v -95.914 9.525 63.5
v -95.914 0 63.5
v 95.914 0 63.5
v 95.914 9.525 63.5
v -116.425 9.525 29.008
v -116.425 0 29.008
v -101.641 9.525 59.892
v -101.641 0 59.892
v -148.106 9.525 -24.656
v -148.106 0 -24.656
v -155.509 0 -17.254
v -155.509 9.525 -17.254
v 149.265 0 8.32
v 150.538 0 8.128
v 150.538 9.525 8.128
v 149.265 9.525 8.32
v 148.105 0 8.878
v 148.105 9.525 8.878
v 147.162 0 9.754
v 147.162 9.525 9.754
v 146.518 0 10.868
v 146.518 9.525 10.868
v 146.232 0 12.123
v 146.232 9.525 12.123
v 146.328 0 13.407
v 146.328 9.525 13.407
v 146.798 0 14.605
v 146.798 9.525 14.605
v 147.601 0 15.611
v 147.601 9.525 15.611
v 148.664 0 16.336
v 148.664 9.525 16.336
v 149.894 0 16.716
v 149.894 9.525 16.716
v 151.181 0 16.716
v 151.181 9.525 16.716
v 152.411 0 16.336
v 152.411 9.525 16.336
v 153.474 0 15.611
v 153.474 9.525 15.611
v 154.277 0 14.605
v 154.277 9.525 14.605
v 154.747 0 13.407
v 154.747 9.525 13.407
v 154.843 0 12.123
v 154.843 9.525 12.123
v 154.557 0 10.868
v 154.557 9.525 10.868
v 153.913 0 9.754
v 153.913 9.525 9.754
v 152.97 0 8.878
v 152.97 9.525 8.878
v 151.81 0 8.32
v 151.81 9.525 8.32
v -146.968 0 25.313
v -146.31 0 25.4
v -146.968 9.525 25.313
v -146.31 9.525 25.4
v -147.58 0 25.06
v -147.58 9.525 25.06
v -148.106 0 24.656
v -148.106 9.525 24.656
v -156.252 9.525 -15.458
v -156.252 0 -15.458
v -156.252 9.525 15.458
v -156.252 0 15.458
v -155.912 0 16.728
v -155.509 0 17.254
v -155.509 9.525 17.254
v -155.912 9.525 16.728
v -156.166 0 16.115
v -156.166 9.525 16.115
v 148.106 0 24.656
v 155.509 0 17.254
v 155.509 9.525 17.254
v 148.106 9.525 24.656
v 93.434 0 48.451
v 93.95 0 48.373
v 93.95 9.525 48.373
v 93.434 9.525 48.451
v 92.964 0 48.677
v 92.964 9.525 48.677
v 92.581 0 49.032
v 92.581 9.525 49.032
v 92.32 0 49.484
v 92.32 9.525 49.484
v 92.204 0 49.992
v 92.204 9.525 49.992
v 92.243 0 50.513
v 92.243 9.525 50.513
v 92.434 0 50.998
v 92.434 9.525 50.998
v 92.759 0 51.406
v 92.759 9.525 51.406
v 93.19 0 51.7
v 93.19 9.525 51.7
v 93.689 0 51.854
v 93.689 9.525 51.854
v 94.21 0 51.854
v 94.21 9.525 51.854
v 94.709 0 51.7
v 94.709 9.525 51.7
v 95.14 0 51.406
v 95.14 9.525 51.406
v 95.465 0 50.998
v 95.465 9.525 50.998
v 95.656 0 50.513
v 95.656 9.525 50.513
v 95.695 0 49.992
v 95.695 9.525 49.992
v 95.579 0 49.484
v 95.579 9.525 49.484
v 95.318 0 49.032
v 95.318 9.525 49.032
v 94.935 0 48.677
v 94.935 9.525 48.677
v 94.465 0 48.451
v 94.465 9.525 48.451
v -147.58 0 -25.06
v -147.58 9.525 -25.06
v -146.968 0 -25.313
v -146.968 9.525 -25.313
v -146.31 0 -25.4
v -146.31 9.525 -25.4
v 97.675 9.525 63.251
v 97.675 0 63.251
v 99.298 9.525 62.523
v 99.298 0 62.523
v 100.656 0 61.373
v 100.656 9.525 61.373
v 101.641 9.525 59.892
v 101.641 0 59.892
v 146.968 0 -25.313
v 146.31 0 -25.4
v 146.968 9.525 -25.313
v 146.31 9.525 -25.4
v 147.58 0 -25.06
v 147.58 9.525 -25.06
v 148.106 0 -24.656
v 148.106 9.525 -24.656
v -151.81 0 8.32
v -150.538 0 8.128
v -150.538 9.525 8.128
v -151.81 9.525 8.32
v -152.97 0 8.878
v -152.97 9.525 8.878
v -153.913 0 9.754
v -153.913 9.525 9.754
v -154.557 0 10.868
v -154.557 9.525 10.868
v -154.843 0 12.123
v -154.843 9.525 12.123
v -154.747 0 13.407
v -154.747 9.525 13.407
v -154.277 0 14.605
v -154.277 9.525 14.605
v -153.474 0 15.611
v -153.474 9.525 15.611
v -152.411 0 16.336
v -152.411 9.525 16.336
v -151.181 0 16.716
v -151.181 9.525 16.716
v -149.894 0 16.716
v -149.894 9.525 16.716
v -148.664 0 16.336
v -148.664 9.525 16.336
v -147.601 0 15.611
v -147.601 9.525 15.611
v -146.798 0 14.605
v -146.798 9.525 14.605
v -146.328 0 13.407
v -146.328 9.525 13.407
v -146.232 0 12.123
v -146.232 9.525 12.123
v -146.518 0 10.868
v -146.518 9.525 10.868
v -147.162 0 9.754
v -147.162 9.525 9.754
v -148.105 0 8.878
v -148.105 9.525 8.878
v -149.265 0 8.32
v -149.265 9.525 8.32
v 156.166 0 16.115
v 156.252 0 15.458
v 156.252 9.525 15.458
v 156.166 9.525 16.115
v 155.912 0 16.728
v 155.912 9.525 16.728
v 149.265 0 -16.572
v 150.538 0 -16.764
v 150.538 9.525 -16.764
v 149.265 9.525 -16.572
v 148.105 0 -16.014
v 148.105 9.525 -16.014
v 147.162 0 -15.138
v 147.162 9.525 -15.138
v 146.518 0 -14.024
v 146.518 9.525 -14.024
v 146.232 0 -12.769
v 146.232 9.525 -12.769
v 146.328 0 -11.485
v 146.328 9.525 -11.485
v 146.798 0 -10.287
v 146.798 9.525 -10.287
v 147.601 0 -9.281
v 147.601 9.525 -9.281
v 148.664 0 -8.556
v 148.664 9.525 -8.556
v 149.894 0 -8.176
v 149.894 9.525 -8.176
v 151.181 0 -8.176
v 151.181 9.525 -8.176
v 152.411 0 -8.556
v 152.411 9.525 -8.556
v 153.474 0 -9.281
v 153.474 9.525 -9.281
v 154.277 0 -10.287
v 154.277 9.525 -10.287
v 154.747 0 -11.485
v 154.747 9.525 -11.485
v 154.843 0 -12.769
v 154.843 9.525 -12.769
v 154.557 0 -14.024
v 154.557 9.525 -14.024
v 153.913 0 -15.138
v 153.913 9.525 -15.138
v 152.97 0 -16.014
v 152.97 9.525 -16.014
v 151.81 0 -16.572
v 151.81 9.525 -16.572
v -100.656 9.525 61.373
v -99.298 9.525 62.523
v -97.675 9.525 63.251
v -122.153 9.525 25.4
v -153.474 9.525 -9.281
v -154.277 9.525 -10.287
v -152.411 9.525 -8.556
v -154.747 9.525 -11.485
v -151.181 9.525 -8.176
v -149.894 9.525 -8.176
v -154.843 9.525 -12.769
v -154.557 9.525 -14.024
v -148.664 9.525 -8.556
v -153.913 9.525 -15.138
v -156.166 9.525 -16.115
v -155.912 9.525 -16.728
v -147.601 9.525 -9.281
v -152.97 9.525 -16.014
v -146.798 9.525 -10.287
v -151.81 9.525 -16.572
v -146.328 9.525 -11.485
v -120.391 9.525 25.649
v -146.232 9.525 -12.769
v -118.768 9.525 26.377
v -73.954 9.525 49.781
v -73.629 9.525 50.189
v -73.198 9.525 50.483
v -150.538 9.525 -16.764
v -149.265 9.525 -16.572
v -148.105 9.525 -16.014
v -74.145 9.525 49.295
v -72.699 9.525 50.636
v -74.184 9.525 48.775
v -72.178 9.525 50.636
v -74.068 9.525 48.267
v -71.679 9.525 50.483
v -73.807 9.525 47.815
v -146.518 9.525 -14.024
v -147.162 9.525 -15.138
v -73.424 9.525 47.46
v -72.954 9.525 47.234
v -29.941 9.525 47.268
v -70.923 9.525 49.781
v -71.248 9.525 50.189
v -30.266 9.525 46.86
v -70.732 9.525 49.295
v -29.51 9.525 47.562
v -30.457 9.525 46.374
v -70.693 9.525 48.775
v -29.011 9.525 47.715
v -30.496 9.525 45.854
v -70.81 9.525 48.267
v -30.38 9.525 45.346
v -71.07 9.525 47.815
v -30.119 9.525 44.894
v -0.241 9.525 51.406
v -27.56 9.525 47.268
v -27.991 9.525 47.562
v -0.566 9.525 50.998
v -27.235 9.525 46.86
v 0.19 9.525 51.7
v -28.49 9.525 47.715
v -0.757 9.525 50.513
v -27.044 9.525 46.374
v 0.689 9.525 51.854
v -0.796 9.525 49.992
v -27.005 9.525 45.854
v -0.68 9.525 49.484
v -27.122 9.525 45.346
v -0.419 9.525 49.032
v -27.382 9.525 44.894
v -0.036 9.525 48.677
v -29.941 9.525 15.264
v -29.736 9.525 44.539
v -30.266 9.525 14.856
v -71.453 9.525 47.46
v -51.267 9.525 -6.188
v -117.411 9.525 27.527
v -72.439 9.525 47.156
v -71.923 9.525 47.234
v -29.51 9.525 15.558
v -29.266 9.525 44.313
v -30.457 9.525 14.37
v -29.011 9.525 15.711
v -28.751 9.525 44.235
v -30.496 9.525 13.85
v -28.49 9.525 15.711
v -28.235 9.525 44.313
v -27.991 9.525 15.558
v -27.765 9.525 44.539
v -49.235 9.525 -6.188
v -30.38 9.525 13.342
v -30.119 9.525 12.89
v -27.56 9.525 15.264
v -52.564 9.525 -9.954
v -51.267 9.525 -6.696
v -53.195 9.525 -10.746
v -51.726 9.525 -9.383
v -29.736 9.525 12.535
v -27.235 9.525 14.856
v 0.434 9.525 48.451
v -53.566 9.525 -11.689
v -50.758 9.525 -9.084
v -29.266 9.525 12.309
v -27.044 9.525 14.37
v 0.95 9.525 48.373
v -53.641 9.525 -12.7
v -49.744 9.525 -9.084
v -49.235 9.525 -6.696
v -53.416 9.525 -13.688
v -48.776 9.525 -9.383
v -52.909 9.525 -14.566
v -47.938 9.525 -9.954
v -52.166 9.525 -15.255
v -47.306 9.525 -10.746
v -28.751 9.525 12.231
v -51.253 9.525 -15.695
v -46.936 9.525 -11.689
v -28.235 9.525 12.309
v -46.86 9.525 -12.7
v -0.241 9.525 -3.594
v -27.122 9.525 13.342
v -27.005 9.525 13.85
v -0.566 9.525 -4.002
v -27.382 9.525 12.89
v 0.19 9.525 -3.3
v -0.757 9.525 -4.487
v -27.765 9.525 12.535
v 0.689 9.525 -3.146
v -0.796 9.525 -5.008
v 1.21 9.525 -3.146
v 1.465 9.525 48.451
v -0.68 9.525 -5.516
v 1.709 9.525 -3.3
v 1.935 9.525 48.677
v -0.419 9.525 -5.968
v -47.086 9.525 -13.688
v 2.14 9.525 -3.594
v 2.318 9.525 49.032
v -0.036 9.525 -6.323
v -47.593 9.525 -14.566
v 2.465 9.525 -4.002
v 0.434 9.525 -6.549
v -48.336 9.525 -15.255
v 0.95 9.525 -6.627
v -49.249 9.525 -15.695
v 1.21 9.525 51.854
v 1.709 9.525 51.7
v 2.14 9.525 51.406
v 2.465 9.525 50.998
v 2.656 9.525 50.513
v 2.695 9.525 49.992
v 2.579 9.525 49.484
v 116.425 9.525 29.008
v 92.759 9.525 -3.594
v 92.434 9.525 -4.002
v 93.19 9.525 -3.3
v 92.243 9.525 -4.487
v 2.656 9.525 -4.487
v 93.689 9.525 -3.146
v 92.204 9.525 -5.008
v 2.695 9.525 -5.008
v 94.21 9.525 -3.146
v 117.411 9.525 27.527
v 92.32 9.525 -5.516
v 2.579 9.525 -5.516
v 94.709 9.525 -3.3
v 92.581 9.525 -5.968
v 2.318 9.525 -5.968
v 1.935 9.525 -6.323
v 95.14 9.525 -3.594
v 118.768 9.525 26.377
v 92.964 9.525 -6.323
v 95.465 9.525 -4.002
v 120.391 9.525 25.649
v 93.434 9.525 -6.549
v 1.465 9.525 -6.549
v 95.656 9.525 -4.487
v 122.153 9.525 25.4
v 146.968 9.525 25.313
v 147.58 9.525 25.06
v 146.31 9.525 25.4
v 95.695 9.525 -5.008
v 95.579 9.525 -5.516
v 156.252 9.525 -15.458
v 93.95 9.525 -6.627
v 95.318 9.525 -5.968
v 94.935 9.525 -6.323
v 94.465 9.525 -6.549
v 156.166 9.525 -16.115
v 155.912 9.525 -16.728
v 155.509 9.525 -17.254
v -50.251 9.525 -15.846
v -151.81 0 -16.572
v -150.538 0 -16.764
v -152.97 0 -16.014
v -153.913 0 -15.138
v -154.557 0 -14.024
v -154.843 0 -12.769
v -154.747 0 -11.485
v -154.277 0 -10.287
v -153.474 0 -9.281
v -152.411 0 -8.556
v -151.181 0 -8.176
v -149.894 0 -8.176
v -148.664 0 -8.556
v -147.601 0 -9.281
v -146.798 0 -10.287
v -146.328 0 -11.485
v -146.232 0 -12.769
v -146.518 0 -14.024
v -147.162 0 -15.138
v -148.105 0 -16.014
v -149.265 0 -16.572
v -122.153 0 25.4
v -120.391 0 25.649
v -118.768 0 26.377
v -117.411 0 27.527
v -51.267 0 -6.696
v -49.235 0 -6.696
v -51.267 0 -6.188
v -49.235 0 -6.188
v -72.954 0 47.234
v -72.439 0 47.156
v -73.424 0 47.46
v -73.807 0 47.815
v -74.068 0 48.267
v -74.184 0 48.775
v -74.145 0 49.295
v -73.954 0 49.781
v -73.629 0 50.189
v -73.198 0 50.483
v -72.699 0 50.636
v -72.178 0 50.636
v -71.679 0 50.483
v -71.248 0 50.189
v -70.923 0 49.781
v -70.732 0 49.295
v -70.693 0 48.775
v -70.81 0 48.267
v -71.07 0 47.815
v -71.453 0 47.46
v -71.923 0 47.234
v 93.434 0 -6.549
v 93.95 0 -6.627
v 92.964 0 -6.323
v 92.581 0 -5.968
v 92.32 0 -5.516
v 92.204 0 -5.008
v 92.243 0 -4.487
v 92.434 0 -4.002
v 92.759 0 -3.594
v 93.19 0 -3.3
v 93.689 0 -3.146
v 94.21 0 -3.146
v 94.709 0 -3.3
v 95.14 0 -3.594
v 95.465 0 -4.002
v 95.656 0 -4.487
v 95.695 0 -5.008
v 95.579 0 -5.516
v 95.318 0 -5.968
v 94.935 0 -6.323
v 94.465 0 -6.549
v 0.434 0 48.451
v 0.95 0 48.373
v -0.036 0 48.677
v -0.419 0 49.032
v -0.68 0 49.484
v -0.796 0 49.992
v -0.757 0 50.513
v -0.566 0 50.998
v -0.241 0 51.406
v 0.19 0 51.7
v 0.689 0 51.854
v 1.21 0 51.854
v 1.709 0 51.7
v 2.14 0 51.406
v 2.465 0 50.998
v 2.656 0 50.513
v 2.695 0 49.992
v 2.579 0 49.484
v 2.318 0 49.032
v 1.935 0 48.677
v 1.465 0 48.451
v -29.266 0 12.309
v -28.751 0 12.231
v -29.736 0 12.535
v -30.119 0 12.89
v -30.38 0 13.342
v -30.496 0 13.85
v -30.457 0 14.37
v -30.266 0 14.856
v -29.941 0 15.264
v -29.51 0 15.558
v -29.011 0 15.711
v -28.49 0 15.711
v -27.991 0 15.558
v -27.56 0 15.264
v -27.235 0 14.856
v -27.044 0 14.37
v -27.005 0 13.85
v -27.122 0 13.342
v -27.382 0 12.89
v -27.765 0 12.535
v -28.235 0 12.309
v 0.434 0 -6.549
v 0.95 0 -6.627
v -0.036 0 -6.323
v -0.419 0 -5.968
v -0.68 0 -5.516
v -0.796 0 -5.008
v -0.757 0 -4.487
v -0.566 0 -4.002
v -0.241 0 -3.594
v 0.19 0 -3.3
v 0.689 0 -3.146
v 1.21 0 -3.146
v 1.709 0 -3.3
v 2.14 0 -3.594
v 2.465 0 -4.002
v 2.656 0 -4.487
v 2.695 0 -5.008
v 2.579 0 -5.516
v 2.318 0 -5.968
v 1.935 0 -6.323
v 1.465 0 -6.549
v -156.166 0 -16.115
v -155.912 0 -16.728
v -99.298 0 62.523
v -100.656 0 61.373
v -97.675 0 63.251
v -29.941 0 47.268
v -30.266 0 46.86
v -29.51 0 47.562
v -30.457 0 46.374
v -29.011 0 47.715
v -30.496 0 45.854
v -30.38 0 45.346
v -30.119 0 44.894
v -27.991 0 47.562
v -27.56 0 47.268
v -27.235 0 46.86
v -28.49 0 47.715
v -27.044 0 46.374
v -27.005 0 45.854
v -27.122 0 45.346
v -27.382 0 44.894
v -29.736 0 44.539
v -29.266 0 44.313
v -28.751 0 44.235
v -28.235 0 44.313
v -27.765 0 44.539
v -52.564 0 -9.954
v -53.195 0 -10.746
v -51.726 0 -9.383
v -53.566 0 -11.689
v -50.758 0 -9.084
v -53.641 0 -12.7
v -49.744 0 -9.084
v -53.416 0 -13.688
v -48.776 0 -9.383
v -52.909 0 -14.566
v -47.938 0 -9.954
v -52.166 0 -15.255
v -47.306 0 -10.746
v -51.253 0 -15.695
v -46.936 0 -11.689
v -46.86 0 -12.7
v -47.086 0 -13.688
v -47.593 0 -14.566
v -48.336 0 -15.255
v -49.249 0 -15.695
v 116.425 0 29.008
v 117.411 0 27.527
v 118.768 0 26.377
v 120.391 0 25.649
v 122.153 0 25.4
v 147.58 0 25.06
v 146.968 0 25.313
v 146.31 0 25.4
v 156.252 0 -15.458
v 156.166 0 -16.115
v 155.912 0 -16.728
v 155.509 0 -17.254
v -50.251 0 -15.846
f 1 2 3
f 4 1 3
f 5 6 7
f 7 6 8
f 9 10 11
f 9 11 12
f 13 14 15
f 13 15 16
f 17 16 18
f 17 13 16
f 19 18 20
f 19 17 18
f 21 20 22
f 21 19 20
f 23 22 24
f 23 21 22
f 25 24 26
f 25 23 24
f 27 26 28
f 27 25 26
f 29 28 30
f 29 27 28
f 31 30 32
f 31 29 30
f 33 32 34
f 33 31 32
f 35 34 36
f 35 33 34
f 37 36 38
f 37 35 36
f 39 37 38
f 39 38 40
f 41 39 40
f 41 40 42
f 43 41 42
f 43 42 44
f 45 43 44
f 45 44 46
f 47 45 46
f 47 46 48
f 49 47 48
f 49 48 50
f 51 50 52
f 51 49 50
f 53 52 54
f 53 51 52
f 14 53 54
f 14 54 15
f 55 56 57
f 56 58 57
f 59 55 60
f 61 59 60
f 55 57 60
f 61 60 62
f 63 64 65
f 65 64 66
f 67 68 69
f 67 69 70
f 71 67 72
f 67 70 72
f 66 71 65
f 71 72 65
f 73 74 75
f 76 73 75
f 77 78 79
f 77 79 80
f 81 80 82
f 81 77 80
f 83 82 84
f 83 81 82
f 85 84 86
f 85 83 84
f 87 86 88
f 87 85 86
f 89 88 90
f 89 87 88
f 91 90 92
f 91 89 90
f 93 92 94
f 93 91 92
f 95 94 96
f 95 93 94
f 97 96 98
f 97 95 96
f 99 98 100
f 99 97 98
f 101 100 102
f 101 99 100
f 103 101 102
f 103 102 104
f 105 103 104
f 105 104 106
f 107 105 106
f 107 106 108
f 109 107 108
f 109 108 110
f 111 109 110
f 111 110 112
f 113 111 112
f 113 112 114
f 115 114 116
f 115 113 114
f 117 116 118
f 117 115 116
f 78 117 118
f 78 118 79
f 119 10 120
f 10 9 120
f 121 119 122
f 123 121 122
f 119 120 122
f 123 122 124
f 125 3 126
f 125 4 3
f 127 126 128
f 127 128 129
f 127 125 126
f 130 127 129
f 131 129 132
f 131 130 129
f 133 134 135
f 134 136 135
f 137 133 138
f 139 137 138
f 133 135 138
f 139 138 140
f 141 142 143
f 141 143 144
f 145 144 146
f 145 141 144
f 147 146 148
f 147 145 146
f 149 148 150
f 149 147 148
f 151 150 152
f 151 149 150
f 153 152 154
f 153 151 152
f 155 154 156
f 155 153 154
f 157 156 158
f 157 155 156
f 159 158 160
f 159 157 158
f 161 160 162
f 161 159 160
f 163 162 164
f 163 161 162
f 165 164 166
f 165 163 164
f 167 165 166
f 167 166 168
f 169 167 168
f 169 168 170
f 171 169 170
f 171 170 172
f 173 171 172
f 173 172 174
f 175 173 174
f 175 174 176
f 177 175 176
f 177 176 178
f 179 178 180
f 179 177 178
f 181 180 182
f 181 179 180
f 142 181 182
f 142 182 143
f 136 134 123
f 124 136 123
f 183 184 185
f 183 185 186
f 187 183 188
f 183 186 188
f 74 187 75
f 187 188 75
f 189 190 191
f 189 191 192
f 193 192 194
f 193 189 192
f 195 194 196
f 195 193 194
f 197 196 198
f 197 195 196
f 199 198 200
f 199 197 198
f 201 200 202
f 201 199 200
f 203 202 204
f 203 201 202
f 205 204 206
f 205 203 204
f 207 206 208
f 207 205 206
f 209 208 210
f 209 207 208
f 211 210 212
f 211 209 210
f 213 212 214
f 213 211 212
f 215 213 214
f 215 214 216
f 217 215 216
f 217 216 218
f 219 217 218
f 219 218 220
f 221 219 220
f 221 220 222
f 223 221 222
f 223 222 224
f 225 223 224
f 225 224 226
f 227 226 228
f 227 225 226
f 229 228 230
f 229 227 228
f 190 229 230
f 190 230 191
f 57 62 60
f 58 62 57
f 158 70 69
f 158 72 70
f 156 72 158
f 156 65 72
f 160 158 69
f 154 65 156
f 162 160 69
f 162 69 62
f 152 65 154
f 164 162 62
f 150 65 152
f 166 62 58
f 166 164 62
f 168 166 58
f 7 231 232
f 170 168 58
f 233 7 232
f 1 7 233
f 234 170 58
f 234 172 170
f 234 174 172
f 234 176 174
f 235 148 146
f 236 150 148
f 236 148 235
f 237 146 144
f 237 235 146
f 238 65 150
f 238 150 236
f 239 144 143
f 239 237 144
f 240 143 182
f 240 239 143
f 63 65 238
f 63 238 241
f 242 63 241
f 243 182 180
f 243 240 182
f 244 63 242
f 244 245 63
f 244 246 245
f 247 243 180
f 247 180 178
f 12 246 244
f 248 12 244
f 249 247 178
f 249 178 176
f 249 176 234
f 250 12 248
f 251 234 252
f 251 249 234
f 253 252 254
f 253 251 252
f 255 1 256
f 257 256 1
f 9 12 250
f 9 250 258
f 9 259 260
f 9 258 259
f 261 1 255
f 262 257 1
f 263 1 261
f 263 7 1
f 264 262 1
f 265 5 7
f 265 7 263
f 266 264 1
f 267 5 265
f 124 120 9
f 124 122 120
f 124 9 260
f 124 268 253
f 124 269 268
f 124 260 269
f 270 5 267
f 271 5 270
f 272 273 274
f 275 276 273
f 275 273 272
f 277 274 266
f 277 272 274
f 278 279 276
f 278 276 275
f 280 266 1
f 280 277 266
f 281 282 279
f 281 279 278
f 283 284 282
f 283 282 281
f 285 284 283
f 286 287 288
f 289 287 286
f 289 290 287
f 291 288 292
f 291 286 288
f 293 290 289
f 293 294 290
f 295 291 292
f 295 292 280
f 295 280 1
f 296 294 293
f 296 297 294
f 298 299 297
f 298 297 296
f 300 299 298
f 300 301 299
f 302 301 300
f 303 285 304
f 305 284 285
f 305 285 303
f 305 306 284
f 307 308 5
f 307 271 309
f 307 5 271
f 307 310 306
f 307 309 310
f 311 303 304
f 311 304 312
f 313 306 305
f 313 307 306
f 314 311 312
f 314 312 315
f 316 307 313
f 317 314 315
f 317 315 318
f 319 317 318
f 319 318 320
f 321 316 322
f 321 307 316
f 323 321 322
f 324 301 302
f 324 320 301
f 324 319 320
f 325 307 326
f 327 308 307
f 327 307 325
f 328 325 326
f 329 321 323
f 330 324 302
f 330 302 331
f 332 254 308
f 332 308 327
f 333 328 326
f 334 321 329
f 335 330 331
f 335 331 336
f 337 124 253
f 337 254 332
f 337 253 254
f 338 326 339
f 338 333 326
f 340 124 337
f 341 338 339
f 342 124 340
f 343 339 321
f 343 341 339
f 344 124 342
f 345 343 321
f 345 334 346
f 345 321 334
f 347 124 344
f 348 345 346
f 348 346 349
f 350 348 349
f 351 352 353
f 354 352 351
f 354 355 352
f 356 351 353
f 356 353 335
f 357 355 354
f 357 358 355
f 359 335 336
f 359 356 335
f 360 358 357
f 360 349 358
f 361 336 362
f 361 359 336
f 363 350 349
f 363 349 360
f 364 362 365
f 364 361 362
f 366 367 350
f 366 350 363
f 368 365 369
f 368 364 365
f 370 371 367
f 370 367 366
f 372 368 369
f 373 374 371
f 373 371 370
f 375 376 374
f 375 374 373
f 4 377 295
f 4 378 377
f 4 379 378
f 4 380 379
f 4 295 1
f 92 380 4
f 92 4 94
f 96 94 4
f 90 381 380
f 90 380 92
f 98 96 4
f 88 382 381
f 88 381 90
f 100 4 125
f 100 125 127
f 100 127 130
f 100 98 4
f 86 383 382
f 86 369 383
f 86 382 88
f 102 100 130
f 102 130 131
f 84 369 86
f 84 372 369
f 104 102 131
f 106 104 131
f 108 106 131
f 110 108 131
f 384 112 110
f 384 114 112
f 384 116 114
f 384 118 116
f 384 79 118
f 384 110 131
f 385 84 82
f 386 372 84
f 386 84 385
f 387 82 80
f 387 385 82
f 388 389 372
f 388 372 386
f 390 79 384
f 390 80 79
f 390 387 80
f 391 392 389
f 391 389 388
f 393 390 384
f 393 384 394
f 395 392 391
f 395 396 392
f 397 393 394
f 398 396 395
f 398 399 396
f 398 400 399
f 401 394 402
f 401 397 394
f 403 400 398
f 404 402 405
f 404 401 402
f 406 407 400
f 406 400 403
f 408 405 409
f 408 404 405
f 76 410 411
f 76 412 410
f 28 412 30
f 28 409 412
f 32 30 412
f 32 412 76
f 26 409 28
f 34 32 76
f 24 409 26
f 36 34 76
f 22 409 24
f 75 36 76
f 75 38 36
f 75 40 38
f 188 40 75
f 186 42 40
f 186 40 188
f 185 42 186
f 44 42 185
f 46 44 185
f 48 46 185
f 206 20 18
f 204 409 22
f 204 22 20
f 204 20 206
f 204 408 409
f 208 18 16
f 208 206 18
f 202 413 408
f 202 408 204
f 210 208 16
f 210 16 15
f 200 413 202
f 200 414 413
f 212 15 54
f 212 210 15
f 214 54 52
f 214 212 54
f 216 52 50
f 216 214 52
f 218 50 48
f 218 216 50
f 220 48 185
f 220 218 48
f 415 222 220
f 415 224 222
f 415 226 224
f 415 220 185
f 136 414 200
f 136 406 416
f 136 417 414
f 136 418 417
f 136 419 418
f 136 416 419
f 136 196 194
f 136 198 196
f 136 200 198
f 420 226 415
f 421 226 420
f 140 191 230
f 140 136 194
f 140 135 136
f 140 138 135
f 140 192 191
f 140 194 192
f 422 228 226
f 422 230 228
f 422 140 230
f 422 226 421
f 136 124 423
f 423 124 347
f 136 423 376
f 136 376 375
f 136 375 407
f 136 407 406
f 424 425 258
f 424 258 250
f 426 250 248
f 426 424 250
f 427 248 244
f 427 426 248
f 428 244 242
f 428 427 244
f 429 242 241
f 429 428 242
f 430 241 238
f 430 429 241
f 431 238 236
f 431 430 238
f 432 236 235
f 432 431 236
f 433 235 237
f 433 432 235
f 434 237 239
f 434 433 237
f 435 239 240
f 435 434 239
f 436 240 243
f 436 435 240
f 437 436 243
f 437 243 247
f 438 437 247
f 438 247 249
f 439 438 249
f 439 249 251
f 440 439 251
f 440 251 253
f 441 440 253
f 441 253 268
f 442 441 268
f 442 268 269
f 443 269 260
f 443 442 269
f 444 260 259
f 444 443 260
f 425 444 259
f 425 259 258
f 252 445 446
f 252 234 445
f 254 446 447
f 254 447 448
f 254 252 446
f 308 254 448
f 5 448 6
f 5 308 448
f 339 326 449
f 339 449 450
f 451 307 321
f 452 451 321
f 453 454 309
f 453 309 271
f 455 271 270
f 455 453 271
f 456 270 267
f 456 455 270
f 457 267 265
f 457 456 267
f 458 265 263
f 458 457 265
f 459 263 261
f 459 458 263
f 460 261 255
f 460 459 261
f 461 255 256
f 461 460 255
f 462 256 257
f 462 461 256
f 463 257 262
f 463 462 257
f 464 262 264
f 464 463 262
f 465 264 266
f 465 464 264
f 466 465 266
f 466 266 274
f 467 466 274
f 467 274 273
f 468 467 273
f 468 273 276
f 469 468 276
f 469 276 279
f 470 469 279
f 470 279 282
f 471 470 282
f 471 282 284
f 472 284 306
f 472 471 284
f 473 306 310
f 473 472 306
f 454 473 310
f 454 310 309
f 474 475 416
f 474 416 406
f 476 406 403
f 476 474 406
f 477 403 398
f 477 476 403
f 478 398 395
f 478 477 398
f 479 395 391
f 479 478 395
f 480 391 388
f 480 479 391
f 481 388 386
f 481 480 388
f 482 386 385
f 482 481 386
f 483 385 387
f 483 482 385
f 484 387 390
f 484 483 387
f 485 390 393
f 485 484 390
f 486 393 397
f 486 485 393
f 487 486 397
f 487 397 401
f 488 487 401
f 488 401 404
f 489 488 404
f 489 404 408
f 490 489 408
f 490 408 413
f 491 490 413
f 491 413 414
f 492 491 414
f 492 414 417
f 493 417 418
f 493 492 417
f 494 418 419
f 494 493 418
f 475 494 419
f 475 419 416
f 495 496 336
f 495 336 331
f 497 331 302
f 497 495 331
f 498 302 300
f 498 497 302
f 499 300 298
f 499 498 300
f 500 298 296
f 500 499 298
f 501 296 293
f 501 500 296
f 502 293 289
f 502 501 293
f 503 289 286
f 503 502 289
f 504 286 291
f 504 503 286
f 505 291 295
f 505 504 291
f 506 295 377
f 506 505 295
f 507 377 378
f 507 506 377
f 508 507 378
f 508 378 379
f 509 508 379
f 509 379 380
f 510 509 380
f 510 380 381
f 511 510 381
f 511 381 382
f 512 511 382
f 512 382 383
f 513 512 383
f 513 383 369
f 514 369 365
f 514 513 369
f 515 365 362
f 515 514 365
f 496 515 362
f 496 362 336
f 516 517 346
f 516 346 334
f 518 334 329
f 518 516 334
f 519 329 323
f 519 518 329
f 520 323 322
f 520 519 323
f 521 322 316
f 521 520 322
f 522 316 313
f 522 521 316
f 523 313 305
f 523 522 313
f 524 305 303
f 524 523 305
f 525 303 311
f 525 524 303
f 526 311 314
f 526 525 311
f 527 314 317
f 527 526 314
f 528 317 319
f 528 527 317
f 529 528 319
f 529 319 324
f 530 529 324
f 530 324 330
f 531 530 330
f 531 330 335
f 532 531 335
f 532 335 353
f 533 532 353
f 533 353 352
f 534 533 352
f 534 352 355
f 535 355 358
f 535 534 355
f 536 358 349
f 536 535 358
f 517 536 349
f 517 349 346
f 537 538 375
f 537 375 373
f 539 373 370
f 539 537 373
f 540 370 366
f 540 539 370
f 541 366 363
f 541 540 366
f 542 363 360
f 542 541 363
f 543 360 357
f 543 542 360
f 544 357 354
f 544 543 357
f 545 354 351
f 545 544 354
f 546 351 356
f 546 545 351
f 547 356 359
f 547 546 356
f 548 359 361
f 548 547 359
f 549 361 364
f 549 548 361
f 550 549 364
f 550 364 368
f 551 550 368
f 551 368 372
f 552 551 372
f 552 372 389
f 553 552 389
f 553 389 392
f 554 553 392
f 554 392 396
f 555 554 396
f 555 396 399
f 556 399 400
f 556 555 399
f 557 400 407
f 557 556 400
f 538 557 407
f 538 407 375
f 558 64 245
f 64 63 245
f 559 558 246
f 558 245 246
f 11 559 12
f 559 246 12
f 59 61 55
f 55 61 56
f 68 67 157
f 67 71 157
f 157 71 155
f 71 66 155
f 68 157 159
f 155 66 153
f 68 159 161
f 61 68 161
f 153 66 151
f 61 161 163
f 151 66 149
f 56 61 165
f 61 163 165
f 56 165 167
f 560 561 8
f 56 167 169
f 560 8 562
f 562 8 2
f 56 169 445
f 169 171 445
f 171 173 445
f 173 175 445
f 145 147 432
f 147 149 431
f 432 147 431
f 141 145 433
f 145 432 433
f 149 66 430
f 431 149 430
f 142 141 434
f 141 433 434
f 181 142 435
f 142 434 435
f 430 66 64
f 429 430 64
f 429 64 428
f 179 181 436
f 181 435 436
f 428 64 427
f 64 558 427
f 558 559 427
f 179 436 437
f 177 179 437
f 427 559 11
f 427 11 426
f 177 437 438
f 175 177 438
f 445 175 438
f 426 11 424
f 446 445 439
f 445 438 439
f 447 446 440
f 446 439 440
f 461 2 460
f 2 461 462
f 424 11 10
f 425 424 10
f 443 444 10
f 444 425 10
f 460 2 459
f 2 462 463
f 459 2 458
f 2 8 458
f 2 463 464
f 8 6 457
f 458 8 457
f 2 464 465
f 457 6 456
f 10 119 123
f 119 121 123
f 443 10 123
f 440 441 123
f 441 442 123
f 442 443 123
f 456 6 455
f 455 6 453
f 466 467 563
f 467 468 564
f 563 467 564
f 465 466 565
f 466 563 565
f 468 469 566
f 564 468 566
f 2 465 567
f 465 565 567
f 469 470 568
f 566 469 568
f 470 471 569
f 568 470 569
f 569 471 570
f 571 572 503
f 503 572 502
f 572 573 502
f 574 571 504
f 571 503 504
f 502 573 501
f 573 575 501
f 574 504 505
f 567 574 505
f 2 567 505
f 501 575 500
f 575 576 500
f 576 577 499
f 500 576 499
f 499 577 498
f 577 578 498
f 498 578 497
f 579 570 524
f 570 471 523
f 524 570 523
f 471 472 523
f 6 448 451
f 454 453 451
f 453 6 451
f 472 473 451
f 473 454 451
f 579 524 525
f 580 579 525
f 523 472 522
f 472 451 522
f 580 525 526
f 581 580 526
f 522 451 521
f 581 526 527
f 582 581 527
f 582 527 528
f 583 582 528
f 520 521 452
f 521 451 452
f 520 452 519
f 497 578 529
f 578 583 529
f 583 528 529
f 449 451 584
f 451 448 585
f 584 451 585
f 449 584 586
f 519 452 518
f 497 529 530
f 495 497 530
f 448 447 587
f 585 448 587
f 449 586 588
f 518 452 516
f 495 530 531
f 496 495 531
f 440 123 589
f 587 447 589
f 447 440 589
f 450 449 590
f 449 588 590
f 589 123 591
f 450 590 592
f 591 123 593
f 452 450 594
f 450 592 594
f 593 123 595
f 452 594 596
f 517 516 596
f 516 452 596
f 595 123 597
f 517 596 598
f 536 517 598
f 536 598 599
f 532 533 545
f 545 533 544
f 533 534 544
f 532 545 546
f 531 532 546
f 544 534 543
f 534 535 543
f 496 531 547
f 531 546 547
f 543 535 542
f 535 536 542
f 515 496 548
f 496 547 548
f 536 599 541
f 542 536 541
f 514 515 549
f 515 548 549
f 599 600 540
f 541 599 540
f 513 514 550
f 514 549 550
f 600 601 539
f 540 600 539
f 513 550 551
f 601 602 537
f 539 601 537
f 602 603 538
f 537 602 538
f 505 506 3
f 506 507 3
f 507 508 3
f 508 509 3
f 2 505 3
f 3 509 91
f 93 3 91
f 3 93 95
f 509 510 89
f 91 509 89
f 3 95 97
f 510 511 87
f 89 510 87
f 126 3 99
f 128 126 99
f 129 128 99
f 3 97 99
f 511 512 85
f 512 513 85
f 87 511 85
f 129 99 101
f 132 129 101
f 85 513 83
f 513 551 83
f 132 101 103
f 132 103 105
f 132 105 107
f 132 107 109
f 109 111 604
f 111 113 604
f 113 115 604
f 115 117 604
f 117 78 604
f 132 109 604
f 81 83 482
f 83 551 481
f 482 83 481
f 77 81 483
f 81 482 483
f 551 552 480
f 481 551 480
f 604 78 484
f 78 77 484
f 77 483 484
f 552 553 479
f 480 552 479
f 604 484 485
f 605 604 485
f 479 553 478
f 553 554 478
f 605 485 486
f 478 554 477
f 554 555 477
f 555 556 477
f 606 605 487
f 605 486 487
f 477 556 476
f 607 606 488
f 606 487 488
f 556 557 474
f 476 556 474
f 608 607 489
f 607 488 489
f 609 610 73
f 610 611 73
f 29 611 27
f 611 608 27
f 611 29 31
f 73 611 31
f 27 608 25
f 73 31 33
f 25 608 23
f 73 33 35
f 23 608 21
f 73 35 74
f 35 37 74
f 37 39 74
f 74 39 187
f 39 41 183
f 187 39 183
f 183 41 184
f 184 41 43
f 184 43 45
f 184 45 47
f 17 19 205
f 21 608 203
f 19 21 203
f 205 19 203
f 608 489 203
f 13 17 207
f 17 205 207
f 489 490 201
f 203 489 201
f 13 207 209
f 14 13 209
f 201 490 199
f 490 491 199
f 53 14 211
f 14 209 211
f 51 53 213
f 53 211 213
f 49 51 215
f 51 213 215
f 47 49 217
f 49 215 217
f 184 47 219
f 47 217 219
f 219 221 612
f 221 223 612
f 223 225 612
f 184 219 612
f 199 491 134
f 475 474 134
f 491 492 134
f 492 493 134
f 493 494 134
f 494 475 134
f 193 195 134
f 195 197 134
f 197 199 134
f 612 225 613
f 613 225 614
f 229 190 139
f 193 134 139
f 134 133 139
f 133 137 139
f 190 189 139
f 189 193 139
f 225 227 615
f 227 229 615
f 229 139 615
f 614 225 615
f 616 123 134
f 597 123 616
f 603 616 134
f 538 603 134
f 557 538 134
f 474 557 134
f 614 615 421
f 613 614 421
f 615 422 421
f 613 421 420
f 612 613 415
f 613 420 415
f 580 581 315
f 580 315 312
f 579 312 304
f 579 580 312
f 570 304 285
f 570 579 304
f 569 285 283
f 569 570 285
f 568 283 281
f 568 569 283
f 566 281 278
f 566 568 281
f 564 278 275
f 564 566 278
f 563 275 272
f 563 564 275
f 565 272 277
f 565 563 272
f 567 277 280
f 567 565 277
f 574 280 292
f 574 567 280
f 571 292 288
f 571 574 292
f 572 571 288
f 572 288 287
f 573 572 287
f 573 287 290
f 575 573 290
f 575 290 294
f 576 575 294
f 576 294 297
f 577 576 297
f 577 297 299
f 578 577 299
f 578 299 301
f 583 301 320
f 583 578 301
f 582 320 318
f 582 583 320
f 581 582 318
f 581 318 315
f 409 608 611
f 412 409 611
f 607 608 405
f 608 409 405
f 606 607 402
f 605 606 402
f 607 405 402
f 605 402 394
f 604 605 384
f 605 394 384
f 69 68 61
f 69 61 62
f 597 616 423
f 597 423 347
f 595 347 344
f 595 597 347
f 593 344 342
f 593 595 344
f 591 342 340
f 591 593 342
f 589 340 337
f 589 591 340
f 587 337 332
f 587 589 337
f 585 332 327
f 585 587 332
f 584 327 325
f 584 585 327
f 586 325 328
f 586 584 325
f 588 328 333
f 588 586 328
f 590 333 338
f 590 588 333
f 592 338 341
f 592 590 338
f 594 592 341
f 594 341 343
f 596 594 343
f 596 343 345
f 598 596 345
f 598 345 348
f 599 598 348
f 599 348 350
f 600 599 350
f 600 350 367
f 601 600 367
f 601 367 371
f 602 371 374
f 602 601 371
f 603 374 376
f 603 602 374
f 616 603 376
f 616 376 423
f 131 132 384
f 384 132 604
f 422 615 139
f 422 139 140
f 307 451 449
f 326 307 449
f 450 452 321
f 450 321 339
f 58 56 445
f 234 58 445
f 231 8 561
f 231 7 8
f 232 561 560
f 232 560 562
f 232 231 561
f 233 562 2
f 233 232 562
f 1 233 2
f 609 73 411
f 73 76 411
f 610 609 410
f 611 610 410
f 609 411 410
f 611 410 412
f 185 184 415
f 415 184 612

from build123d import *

# Parameters (mm, degrees)
SKETCH1_R           = 1.75
SKETCH1_R_2         = 4.318
SKETCH1_W           = 2.032
SKETCH1_H           = 0.508
SKETCH1_R_3         = 3.4
BOSS_EXTRUDE1_DEPTH = 9.525
FILLET1_R           = 6.35
CHAMFER1_SIZE       = 8.89
FILLET2_R           = 2.54


with BuildPart() as part:
    # Sketch1 → Boss-Extrude1 (new body)
    with BuildSketch(Plane(origin=(0, 0, 0), x_dir=(1, 0, 0), z_dir=(0, 1, 0))):
        Polygon((-156.2525, 25.4), (-156.2525, -25.4), (-118.1525, -25.4), (-99.913840717, -63.5), (99.913840717, -63.5), (118.1525, -25.4), (156.2525, -25.4), (156.2525, 25.4), align=None)
        with Locations(Location((-72.438538283, -48.905859703, 0), (0, 0, 90))):
            Circle(SKETCH1_R, mode=Mode.SUBTRACT)
        with Locations(Location((-28.750538283, -45.984859703, 0), (0, 0, 90))):
            Circle(SKETCH1_R, mode=Mode.SUBTRACT)
        with Locations(Location((-150.5375, -12.446, 0), (0, 0, 90))):
            Circle(SKETCH1_R_2, mode=Mode.SUBTRACT)
        with Locations(Location((-28.750538283, -13.980859703, 0), (0, 0, 90))):
            Circle(SKETCH1_R, mode=Mode.SUBTRACT)
        with Locations(Location((93.949510286, 4.876851367, 0), (0, 0, 90))):
            Circle(SKETCH1_R, mode=Mode.SUBTRACT)
        with Locations(Location((0.949510286, 4.876851367, 0), (0, 0, 90))):
            Circle(SKETCH1_R, mode=Mode.SUBTRACT)
        with Locations(Location((0.949510286, -50.123148633, 0), (0, 0, 90))):
            Circle(SKETCH1_R, mode=Mode.SUBTRACT)
        with Locations(Location((93.949510286, -50.123148633, 0), (0, 0, 90))):
            Circle(SKETCH1_R, mode=Mode.SUBTRACT)
        with Locations(Location((150.5375, -12.446, 0), (0, 0, 90))):
            Circle(SKETCH1_R_2, mode=Mode.SUBTRACT)
        with Locations(Location((-150.5375, 12.446, 0), (0, 0, 90))):
            Circle(SKETCH1_R_2, mode=Mode.SUBTRACT)
        with Locations((-50.250952403, 6.442)):
            Rectangle(SKETCH1_W, SKETCH1_H, mode=Mode.SUBTRACT)
        with Locations(Location((-50.250952403, 12.446, 0), (0, 0, 90))):
            Circle(SKETCH1_R_3, mode=Mode.SUBTRACT)
        with Locations(Location((150.5375, 12.446, 0), (0, 0, 90))):
            Circle(SKETCH1_R_2, mode=Mode.SUBTRACT)
    extrude(amount=BOSS_EXTRUDE1_DEPTH)

    # Fillet1
    fillet1_edges = [part.edges().sort_by_distance(p)[0] for p in [
        (118.1525, 4.7625, 25.4),
        (99.913840717, 4.7625, 63.5),
        (-99.913840717, 4.7625, 63.5),
        (-118.1525, 4.7625, 25.4),
    ]]
    fillet(fillet1_edges, radius=FILLET1_R)

    # Chamfer1
    chamfer1_edges = [part.edges().sort_by_distance(p)[0] for p in [
        (156.2525, 4.7625, -25.4),
        (156.2525, 4.7625, 25.4),
        (-156.2525, 4.7625, 25.4),
        (-156.2525, 4.7625, -25.4),
    ]]
    chamfer(chamfer1_edges, length=CHAMFER1_SIZE)

    # Fillet2
    fillet2_edges = [part.edges().sort_by_distance(p)[0] for p in [
        (-156.2525, 4.7625, 16.51),
        (-156.2525, 4.7625, -16.51),
        (147.3625, 4.7625, -25.4),
        (-147.3625, 4.7625, -25.4),
        (-147.3625, 4.7625, 25.4),
        (156.2525, 4.7625, 16.51),
        (156.2525, 4.7625, -16.51),
        (147.3625, 4.7625, 25.4),
    ]]
    fillet(fillet2_edges, radius=FILLET2_R)


solid = part.part
